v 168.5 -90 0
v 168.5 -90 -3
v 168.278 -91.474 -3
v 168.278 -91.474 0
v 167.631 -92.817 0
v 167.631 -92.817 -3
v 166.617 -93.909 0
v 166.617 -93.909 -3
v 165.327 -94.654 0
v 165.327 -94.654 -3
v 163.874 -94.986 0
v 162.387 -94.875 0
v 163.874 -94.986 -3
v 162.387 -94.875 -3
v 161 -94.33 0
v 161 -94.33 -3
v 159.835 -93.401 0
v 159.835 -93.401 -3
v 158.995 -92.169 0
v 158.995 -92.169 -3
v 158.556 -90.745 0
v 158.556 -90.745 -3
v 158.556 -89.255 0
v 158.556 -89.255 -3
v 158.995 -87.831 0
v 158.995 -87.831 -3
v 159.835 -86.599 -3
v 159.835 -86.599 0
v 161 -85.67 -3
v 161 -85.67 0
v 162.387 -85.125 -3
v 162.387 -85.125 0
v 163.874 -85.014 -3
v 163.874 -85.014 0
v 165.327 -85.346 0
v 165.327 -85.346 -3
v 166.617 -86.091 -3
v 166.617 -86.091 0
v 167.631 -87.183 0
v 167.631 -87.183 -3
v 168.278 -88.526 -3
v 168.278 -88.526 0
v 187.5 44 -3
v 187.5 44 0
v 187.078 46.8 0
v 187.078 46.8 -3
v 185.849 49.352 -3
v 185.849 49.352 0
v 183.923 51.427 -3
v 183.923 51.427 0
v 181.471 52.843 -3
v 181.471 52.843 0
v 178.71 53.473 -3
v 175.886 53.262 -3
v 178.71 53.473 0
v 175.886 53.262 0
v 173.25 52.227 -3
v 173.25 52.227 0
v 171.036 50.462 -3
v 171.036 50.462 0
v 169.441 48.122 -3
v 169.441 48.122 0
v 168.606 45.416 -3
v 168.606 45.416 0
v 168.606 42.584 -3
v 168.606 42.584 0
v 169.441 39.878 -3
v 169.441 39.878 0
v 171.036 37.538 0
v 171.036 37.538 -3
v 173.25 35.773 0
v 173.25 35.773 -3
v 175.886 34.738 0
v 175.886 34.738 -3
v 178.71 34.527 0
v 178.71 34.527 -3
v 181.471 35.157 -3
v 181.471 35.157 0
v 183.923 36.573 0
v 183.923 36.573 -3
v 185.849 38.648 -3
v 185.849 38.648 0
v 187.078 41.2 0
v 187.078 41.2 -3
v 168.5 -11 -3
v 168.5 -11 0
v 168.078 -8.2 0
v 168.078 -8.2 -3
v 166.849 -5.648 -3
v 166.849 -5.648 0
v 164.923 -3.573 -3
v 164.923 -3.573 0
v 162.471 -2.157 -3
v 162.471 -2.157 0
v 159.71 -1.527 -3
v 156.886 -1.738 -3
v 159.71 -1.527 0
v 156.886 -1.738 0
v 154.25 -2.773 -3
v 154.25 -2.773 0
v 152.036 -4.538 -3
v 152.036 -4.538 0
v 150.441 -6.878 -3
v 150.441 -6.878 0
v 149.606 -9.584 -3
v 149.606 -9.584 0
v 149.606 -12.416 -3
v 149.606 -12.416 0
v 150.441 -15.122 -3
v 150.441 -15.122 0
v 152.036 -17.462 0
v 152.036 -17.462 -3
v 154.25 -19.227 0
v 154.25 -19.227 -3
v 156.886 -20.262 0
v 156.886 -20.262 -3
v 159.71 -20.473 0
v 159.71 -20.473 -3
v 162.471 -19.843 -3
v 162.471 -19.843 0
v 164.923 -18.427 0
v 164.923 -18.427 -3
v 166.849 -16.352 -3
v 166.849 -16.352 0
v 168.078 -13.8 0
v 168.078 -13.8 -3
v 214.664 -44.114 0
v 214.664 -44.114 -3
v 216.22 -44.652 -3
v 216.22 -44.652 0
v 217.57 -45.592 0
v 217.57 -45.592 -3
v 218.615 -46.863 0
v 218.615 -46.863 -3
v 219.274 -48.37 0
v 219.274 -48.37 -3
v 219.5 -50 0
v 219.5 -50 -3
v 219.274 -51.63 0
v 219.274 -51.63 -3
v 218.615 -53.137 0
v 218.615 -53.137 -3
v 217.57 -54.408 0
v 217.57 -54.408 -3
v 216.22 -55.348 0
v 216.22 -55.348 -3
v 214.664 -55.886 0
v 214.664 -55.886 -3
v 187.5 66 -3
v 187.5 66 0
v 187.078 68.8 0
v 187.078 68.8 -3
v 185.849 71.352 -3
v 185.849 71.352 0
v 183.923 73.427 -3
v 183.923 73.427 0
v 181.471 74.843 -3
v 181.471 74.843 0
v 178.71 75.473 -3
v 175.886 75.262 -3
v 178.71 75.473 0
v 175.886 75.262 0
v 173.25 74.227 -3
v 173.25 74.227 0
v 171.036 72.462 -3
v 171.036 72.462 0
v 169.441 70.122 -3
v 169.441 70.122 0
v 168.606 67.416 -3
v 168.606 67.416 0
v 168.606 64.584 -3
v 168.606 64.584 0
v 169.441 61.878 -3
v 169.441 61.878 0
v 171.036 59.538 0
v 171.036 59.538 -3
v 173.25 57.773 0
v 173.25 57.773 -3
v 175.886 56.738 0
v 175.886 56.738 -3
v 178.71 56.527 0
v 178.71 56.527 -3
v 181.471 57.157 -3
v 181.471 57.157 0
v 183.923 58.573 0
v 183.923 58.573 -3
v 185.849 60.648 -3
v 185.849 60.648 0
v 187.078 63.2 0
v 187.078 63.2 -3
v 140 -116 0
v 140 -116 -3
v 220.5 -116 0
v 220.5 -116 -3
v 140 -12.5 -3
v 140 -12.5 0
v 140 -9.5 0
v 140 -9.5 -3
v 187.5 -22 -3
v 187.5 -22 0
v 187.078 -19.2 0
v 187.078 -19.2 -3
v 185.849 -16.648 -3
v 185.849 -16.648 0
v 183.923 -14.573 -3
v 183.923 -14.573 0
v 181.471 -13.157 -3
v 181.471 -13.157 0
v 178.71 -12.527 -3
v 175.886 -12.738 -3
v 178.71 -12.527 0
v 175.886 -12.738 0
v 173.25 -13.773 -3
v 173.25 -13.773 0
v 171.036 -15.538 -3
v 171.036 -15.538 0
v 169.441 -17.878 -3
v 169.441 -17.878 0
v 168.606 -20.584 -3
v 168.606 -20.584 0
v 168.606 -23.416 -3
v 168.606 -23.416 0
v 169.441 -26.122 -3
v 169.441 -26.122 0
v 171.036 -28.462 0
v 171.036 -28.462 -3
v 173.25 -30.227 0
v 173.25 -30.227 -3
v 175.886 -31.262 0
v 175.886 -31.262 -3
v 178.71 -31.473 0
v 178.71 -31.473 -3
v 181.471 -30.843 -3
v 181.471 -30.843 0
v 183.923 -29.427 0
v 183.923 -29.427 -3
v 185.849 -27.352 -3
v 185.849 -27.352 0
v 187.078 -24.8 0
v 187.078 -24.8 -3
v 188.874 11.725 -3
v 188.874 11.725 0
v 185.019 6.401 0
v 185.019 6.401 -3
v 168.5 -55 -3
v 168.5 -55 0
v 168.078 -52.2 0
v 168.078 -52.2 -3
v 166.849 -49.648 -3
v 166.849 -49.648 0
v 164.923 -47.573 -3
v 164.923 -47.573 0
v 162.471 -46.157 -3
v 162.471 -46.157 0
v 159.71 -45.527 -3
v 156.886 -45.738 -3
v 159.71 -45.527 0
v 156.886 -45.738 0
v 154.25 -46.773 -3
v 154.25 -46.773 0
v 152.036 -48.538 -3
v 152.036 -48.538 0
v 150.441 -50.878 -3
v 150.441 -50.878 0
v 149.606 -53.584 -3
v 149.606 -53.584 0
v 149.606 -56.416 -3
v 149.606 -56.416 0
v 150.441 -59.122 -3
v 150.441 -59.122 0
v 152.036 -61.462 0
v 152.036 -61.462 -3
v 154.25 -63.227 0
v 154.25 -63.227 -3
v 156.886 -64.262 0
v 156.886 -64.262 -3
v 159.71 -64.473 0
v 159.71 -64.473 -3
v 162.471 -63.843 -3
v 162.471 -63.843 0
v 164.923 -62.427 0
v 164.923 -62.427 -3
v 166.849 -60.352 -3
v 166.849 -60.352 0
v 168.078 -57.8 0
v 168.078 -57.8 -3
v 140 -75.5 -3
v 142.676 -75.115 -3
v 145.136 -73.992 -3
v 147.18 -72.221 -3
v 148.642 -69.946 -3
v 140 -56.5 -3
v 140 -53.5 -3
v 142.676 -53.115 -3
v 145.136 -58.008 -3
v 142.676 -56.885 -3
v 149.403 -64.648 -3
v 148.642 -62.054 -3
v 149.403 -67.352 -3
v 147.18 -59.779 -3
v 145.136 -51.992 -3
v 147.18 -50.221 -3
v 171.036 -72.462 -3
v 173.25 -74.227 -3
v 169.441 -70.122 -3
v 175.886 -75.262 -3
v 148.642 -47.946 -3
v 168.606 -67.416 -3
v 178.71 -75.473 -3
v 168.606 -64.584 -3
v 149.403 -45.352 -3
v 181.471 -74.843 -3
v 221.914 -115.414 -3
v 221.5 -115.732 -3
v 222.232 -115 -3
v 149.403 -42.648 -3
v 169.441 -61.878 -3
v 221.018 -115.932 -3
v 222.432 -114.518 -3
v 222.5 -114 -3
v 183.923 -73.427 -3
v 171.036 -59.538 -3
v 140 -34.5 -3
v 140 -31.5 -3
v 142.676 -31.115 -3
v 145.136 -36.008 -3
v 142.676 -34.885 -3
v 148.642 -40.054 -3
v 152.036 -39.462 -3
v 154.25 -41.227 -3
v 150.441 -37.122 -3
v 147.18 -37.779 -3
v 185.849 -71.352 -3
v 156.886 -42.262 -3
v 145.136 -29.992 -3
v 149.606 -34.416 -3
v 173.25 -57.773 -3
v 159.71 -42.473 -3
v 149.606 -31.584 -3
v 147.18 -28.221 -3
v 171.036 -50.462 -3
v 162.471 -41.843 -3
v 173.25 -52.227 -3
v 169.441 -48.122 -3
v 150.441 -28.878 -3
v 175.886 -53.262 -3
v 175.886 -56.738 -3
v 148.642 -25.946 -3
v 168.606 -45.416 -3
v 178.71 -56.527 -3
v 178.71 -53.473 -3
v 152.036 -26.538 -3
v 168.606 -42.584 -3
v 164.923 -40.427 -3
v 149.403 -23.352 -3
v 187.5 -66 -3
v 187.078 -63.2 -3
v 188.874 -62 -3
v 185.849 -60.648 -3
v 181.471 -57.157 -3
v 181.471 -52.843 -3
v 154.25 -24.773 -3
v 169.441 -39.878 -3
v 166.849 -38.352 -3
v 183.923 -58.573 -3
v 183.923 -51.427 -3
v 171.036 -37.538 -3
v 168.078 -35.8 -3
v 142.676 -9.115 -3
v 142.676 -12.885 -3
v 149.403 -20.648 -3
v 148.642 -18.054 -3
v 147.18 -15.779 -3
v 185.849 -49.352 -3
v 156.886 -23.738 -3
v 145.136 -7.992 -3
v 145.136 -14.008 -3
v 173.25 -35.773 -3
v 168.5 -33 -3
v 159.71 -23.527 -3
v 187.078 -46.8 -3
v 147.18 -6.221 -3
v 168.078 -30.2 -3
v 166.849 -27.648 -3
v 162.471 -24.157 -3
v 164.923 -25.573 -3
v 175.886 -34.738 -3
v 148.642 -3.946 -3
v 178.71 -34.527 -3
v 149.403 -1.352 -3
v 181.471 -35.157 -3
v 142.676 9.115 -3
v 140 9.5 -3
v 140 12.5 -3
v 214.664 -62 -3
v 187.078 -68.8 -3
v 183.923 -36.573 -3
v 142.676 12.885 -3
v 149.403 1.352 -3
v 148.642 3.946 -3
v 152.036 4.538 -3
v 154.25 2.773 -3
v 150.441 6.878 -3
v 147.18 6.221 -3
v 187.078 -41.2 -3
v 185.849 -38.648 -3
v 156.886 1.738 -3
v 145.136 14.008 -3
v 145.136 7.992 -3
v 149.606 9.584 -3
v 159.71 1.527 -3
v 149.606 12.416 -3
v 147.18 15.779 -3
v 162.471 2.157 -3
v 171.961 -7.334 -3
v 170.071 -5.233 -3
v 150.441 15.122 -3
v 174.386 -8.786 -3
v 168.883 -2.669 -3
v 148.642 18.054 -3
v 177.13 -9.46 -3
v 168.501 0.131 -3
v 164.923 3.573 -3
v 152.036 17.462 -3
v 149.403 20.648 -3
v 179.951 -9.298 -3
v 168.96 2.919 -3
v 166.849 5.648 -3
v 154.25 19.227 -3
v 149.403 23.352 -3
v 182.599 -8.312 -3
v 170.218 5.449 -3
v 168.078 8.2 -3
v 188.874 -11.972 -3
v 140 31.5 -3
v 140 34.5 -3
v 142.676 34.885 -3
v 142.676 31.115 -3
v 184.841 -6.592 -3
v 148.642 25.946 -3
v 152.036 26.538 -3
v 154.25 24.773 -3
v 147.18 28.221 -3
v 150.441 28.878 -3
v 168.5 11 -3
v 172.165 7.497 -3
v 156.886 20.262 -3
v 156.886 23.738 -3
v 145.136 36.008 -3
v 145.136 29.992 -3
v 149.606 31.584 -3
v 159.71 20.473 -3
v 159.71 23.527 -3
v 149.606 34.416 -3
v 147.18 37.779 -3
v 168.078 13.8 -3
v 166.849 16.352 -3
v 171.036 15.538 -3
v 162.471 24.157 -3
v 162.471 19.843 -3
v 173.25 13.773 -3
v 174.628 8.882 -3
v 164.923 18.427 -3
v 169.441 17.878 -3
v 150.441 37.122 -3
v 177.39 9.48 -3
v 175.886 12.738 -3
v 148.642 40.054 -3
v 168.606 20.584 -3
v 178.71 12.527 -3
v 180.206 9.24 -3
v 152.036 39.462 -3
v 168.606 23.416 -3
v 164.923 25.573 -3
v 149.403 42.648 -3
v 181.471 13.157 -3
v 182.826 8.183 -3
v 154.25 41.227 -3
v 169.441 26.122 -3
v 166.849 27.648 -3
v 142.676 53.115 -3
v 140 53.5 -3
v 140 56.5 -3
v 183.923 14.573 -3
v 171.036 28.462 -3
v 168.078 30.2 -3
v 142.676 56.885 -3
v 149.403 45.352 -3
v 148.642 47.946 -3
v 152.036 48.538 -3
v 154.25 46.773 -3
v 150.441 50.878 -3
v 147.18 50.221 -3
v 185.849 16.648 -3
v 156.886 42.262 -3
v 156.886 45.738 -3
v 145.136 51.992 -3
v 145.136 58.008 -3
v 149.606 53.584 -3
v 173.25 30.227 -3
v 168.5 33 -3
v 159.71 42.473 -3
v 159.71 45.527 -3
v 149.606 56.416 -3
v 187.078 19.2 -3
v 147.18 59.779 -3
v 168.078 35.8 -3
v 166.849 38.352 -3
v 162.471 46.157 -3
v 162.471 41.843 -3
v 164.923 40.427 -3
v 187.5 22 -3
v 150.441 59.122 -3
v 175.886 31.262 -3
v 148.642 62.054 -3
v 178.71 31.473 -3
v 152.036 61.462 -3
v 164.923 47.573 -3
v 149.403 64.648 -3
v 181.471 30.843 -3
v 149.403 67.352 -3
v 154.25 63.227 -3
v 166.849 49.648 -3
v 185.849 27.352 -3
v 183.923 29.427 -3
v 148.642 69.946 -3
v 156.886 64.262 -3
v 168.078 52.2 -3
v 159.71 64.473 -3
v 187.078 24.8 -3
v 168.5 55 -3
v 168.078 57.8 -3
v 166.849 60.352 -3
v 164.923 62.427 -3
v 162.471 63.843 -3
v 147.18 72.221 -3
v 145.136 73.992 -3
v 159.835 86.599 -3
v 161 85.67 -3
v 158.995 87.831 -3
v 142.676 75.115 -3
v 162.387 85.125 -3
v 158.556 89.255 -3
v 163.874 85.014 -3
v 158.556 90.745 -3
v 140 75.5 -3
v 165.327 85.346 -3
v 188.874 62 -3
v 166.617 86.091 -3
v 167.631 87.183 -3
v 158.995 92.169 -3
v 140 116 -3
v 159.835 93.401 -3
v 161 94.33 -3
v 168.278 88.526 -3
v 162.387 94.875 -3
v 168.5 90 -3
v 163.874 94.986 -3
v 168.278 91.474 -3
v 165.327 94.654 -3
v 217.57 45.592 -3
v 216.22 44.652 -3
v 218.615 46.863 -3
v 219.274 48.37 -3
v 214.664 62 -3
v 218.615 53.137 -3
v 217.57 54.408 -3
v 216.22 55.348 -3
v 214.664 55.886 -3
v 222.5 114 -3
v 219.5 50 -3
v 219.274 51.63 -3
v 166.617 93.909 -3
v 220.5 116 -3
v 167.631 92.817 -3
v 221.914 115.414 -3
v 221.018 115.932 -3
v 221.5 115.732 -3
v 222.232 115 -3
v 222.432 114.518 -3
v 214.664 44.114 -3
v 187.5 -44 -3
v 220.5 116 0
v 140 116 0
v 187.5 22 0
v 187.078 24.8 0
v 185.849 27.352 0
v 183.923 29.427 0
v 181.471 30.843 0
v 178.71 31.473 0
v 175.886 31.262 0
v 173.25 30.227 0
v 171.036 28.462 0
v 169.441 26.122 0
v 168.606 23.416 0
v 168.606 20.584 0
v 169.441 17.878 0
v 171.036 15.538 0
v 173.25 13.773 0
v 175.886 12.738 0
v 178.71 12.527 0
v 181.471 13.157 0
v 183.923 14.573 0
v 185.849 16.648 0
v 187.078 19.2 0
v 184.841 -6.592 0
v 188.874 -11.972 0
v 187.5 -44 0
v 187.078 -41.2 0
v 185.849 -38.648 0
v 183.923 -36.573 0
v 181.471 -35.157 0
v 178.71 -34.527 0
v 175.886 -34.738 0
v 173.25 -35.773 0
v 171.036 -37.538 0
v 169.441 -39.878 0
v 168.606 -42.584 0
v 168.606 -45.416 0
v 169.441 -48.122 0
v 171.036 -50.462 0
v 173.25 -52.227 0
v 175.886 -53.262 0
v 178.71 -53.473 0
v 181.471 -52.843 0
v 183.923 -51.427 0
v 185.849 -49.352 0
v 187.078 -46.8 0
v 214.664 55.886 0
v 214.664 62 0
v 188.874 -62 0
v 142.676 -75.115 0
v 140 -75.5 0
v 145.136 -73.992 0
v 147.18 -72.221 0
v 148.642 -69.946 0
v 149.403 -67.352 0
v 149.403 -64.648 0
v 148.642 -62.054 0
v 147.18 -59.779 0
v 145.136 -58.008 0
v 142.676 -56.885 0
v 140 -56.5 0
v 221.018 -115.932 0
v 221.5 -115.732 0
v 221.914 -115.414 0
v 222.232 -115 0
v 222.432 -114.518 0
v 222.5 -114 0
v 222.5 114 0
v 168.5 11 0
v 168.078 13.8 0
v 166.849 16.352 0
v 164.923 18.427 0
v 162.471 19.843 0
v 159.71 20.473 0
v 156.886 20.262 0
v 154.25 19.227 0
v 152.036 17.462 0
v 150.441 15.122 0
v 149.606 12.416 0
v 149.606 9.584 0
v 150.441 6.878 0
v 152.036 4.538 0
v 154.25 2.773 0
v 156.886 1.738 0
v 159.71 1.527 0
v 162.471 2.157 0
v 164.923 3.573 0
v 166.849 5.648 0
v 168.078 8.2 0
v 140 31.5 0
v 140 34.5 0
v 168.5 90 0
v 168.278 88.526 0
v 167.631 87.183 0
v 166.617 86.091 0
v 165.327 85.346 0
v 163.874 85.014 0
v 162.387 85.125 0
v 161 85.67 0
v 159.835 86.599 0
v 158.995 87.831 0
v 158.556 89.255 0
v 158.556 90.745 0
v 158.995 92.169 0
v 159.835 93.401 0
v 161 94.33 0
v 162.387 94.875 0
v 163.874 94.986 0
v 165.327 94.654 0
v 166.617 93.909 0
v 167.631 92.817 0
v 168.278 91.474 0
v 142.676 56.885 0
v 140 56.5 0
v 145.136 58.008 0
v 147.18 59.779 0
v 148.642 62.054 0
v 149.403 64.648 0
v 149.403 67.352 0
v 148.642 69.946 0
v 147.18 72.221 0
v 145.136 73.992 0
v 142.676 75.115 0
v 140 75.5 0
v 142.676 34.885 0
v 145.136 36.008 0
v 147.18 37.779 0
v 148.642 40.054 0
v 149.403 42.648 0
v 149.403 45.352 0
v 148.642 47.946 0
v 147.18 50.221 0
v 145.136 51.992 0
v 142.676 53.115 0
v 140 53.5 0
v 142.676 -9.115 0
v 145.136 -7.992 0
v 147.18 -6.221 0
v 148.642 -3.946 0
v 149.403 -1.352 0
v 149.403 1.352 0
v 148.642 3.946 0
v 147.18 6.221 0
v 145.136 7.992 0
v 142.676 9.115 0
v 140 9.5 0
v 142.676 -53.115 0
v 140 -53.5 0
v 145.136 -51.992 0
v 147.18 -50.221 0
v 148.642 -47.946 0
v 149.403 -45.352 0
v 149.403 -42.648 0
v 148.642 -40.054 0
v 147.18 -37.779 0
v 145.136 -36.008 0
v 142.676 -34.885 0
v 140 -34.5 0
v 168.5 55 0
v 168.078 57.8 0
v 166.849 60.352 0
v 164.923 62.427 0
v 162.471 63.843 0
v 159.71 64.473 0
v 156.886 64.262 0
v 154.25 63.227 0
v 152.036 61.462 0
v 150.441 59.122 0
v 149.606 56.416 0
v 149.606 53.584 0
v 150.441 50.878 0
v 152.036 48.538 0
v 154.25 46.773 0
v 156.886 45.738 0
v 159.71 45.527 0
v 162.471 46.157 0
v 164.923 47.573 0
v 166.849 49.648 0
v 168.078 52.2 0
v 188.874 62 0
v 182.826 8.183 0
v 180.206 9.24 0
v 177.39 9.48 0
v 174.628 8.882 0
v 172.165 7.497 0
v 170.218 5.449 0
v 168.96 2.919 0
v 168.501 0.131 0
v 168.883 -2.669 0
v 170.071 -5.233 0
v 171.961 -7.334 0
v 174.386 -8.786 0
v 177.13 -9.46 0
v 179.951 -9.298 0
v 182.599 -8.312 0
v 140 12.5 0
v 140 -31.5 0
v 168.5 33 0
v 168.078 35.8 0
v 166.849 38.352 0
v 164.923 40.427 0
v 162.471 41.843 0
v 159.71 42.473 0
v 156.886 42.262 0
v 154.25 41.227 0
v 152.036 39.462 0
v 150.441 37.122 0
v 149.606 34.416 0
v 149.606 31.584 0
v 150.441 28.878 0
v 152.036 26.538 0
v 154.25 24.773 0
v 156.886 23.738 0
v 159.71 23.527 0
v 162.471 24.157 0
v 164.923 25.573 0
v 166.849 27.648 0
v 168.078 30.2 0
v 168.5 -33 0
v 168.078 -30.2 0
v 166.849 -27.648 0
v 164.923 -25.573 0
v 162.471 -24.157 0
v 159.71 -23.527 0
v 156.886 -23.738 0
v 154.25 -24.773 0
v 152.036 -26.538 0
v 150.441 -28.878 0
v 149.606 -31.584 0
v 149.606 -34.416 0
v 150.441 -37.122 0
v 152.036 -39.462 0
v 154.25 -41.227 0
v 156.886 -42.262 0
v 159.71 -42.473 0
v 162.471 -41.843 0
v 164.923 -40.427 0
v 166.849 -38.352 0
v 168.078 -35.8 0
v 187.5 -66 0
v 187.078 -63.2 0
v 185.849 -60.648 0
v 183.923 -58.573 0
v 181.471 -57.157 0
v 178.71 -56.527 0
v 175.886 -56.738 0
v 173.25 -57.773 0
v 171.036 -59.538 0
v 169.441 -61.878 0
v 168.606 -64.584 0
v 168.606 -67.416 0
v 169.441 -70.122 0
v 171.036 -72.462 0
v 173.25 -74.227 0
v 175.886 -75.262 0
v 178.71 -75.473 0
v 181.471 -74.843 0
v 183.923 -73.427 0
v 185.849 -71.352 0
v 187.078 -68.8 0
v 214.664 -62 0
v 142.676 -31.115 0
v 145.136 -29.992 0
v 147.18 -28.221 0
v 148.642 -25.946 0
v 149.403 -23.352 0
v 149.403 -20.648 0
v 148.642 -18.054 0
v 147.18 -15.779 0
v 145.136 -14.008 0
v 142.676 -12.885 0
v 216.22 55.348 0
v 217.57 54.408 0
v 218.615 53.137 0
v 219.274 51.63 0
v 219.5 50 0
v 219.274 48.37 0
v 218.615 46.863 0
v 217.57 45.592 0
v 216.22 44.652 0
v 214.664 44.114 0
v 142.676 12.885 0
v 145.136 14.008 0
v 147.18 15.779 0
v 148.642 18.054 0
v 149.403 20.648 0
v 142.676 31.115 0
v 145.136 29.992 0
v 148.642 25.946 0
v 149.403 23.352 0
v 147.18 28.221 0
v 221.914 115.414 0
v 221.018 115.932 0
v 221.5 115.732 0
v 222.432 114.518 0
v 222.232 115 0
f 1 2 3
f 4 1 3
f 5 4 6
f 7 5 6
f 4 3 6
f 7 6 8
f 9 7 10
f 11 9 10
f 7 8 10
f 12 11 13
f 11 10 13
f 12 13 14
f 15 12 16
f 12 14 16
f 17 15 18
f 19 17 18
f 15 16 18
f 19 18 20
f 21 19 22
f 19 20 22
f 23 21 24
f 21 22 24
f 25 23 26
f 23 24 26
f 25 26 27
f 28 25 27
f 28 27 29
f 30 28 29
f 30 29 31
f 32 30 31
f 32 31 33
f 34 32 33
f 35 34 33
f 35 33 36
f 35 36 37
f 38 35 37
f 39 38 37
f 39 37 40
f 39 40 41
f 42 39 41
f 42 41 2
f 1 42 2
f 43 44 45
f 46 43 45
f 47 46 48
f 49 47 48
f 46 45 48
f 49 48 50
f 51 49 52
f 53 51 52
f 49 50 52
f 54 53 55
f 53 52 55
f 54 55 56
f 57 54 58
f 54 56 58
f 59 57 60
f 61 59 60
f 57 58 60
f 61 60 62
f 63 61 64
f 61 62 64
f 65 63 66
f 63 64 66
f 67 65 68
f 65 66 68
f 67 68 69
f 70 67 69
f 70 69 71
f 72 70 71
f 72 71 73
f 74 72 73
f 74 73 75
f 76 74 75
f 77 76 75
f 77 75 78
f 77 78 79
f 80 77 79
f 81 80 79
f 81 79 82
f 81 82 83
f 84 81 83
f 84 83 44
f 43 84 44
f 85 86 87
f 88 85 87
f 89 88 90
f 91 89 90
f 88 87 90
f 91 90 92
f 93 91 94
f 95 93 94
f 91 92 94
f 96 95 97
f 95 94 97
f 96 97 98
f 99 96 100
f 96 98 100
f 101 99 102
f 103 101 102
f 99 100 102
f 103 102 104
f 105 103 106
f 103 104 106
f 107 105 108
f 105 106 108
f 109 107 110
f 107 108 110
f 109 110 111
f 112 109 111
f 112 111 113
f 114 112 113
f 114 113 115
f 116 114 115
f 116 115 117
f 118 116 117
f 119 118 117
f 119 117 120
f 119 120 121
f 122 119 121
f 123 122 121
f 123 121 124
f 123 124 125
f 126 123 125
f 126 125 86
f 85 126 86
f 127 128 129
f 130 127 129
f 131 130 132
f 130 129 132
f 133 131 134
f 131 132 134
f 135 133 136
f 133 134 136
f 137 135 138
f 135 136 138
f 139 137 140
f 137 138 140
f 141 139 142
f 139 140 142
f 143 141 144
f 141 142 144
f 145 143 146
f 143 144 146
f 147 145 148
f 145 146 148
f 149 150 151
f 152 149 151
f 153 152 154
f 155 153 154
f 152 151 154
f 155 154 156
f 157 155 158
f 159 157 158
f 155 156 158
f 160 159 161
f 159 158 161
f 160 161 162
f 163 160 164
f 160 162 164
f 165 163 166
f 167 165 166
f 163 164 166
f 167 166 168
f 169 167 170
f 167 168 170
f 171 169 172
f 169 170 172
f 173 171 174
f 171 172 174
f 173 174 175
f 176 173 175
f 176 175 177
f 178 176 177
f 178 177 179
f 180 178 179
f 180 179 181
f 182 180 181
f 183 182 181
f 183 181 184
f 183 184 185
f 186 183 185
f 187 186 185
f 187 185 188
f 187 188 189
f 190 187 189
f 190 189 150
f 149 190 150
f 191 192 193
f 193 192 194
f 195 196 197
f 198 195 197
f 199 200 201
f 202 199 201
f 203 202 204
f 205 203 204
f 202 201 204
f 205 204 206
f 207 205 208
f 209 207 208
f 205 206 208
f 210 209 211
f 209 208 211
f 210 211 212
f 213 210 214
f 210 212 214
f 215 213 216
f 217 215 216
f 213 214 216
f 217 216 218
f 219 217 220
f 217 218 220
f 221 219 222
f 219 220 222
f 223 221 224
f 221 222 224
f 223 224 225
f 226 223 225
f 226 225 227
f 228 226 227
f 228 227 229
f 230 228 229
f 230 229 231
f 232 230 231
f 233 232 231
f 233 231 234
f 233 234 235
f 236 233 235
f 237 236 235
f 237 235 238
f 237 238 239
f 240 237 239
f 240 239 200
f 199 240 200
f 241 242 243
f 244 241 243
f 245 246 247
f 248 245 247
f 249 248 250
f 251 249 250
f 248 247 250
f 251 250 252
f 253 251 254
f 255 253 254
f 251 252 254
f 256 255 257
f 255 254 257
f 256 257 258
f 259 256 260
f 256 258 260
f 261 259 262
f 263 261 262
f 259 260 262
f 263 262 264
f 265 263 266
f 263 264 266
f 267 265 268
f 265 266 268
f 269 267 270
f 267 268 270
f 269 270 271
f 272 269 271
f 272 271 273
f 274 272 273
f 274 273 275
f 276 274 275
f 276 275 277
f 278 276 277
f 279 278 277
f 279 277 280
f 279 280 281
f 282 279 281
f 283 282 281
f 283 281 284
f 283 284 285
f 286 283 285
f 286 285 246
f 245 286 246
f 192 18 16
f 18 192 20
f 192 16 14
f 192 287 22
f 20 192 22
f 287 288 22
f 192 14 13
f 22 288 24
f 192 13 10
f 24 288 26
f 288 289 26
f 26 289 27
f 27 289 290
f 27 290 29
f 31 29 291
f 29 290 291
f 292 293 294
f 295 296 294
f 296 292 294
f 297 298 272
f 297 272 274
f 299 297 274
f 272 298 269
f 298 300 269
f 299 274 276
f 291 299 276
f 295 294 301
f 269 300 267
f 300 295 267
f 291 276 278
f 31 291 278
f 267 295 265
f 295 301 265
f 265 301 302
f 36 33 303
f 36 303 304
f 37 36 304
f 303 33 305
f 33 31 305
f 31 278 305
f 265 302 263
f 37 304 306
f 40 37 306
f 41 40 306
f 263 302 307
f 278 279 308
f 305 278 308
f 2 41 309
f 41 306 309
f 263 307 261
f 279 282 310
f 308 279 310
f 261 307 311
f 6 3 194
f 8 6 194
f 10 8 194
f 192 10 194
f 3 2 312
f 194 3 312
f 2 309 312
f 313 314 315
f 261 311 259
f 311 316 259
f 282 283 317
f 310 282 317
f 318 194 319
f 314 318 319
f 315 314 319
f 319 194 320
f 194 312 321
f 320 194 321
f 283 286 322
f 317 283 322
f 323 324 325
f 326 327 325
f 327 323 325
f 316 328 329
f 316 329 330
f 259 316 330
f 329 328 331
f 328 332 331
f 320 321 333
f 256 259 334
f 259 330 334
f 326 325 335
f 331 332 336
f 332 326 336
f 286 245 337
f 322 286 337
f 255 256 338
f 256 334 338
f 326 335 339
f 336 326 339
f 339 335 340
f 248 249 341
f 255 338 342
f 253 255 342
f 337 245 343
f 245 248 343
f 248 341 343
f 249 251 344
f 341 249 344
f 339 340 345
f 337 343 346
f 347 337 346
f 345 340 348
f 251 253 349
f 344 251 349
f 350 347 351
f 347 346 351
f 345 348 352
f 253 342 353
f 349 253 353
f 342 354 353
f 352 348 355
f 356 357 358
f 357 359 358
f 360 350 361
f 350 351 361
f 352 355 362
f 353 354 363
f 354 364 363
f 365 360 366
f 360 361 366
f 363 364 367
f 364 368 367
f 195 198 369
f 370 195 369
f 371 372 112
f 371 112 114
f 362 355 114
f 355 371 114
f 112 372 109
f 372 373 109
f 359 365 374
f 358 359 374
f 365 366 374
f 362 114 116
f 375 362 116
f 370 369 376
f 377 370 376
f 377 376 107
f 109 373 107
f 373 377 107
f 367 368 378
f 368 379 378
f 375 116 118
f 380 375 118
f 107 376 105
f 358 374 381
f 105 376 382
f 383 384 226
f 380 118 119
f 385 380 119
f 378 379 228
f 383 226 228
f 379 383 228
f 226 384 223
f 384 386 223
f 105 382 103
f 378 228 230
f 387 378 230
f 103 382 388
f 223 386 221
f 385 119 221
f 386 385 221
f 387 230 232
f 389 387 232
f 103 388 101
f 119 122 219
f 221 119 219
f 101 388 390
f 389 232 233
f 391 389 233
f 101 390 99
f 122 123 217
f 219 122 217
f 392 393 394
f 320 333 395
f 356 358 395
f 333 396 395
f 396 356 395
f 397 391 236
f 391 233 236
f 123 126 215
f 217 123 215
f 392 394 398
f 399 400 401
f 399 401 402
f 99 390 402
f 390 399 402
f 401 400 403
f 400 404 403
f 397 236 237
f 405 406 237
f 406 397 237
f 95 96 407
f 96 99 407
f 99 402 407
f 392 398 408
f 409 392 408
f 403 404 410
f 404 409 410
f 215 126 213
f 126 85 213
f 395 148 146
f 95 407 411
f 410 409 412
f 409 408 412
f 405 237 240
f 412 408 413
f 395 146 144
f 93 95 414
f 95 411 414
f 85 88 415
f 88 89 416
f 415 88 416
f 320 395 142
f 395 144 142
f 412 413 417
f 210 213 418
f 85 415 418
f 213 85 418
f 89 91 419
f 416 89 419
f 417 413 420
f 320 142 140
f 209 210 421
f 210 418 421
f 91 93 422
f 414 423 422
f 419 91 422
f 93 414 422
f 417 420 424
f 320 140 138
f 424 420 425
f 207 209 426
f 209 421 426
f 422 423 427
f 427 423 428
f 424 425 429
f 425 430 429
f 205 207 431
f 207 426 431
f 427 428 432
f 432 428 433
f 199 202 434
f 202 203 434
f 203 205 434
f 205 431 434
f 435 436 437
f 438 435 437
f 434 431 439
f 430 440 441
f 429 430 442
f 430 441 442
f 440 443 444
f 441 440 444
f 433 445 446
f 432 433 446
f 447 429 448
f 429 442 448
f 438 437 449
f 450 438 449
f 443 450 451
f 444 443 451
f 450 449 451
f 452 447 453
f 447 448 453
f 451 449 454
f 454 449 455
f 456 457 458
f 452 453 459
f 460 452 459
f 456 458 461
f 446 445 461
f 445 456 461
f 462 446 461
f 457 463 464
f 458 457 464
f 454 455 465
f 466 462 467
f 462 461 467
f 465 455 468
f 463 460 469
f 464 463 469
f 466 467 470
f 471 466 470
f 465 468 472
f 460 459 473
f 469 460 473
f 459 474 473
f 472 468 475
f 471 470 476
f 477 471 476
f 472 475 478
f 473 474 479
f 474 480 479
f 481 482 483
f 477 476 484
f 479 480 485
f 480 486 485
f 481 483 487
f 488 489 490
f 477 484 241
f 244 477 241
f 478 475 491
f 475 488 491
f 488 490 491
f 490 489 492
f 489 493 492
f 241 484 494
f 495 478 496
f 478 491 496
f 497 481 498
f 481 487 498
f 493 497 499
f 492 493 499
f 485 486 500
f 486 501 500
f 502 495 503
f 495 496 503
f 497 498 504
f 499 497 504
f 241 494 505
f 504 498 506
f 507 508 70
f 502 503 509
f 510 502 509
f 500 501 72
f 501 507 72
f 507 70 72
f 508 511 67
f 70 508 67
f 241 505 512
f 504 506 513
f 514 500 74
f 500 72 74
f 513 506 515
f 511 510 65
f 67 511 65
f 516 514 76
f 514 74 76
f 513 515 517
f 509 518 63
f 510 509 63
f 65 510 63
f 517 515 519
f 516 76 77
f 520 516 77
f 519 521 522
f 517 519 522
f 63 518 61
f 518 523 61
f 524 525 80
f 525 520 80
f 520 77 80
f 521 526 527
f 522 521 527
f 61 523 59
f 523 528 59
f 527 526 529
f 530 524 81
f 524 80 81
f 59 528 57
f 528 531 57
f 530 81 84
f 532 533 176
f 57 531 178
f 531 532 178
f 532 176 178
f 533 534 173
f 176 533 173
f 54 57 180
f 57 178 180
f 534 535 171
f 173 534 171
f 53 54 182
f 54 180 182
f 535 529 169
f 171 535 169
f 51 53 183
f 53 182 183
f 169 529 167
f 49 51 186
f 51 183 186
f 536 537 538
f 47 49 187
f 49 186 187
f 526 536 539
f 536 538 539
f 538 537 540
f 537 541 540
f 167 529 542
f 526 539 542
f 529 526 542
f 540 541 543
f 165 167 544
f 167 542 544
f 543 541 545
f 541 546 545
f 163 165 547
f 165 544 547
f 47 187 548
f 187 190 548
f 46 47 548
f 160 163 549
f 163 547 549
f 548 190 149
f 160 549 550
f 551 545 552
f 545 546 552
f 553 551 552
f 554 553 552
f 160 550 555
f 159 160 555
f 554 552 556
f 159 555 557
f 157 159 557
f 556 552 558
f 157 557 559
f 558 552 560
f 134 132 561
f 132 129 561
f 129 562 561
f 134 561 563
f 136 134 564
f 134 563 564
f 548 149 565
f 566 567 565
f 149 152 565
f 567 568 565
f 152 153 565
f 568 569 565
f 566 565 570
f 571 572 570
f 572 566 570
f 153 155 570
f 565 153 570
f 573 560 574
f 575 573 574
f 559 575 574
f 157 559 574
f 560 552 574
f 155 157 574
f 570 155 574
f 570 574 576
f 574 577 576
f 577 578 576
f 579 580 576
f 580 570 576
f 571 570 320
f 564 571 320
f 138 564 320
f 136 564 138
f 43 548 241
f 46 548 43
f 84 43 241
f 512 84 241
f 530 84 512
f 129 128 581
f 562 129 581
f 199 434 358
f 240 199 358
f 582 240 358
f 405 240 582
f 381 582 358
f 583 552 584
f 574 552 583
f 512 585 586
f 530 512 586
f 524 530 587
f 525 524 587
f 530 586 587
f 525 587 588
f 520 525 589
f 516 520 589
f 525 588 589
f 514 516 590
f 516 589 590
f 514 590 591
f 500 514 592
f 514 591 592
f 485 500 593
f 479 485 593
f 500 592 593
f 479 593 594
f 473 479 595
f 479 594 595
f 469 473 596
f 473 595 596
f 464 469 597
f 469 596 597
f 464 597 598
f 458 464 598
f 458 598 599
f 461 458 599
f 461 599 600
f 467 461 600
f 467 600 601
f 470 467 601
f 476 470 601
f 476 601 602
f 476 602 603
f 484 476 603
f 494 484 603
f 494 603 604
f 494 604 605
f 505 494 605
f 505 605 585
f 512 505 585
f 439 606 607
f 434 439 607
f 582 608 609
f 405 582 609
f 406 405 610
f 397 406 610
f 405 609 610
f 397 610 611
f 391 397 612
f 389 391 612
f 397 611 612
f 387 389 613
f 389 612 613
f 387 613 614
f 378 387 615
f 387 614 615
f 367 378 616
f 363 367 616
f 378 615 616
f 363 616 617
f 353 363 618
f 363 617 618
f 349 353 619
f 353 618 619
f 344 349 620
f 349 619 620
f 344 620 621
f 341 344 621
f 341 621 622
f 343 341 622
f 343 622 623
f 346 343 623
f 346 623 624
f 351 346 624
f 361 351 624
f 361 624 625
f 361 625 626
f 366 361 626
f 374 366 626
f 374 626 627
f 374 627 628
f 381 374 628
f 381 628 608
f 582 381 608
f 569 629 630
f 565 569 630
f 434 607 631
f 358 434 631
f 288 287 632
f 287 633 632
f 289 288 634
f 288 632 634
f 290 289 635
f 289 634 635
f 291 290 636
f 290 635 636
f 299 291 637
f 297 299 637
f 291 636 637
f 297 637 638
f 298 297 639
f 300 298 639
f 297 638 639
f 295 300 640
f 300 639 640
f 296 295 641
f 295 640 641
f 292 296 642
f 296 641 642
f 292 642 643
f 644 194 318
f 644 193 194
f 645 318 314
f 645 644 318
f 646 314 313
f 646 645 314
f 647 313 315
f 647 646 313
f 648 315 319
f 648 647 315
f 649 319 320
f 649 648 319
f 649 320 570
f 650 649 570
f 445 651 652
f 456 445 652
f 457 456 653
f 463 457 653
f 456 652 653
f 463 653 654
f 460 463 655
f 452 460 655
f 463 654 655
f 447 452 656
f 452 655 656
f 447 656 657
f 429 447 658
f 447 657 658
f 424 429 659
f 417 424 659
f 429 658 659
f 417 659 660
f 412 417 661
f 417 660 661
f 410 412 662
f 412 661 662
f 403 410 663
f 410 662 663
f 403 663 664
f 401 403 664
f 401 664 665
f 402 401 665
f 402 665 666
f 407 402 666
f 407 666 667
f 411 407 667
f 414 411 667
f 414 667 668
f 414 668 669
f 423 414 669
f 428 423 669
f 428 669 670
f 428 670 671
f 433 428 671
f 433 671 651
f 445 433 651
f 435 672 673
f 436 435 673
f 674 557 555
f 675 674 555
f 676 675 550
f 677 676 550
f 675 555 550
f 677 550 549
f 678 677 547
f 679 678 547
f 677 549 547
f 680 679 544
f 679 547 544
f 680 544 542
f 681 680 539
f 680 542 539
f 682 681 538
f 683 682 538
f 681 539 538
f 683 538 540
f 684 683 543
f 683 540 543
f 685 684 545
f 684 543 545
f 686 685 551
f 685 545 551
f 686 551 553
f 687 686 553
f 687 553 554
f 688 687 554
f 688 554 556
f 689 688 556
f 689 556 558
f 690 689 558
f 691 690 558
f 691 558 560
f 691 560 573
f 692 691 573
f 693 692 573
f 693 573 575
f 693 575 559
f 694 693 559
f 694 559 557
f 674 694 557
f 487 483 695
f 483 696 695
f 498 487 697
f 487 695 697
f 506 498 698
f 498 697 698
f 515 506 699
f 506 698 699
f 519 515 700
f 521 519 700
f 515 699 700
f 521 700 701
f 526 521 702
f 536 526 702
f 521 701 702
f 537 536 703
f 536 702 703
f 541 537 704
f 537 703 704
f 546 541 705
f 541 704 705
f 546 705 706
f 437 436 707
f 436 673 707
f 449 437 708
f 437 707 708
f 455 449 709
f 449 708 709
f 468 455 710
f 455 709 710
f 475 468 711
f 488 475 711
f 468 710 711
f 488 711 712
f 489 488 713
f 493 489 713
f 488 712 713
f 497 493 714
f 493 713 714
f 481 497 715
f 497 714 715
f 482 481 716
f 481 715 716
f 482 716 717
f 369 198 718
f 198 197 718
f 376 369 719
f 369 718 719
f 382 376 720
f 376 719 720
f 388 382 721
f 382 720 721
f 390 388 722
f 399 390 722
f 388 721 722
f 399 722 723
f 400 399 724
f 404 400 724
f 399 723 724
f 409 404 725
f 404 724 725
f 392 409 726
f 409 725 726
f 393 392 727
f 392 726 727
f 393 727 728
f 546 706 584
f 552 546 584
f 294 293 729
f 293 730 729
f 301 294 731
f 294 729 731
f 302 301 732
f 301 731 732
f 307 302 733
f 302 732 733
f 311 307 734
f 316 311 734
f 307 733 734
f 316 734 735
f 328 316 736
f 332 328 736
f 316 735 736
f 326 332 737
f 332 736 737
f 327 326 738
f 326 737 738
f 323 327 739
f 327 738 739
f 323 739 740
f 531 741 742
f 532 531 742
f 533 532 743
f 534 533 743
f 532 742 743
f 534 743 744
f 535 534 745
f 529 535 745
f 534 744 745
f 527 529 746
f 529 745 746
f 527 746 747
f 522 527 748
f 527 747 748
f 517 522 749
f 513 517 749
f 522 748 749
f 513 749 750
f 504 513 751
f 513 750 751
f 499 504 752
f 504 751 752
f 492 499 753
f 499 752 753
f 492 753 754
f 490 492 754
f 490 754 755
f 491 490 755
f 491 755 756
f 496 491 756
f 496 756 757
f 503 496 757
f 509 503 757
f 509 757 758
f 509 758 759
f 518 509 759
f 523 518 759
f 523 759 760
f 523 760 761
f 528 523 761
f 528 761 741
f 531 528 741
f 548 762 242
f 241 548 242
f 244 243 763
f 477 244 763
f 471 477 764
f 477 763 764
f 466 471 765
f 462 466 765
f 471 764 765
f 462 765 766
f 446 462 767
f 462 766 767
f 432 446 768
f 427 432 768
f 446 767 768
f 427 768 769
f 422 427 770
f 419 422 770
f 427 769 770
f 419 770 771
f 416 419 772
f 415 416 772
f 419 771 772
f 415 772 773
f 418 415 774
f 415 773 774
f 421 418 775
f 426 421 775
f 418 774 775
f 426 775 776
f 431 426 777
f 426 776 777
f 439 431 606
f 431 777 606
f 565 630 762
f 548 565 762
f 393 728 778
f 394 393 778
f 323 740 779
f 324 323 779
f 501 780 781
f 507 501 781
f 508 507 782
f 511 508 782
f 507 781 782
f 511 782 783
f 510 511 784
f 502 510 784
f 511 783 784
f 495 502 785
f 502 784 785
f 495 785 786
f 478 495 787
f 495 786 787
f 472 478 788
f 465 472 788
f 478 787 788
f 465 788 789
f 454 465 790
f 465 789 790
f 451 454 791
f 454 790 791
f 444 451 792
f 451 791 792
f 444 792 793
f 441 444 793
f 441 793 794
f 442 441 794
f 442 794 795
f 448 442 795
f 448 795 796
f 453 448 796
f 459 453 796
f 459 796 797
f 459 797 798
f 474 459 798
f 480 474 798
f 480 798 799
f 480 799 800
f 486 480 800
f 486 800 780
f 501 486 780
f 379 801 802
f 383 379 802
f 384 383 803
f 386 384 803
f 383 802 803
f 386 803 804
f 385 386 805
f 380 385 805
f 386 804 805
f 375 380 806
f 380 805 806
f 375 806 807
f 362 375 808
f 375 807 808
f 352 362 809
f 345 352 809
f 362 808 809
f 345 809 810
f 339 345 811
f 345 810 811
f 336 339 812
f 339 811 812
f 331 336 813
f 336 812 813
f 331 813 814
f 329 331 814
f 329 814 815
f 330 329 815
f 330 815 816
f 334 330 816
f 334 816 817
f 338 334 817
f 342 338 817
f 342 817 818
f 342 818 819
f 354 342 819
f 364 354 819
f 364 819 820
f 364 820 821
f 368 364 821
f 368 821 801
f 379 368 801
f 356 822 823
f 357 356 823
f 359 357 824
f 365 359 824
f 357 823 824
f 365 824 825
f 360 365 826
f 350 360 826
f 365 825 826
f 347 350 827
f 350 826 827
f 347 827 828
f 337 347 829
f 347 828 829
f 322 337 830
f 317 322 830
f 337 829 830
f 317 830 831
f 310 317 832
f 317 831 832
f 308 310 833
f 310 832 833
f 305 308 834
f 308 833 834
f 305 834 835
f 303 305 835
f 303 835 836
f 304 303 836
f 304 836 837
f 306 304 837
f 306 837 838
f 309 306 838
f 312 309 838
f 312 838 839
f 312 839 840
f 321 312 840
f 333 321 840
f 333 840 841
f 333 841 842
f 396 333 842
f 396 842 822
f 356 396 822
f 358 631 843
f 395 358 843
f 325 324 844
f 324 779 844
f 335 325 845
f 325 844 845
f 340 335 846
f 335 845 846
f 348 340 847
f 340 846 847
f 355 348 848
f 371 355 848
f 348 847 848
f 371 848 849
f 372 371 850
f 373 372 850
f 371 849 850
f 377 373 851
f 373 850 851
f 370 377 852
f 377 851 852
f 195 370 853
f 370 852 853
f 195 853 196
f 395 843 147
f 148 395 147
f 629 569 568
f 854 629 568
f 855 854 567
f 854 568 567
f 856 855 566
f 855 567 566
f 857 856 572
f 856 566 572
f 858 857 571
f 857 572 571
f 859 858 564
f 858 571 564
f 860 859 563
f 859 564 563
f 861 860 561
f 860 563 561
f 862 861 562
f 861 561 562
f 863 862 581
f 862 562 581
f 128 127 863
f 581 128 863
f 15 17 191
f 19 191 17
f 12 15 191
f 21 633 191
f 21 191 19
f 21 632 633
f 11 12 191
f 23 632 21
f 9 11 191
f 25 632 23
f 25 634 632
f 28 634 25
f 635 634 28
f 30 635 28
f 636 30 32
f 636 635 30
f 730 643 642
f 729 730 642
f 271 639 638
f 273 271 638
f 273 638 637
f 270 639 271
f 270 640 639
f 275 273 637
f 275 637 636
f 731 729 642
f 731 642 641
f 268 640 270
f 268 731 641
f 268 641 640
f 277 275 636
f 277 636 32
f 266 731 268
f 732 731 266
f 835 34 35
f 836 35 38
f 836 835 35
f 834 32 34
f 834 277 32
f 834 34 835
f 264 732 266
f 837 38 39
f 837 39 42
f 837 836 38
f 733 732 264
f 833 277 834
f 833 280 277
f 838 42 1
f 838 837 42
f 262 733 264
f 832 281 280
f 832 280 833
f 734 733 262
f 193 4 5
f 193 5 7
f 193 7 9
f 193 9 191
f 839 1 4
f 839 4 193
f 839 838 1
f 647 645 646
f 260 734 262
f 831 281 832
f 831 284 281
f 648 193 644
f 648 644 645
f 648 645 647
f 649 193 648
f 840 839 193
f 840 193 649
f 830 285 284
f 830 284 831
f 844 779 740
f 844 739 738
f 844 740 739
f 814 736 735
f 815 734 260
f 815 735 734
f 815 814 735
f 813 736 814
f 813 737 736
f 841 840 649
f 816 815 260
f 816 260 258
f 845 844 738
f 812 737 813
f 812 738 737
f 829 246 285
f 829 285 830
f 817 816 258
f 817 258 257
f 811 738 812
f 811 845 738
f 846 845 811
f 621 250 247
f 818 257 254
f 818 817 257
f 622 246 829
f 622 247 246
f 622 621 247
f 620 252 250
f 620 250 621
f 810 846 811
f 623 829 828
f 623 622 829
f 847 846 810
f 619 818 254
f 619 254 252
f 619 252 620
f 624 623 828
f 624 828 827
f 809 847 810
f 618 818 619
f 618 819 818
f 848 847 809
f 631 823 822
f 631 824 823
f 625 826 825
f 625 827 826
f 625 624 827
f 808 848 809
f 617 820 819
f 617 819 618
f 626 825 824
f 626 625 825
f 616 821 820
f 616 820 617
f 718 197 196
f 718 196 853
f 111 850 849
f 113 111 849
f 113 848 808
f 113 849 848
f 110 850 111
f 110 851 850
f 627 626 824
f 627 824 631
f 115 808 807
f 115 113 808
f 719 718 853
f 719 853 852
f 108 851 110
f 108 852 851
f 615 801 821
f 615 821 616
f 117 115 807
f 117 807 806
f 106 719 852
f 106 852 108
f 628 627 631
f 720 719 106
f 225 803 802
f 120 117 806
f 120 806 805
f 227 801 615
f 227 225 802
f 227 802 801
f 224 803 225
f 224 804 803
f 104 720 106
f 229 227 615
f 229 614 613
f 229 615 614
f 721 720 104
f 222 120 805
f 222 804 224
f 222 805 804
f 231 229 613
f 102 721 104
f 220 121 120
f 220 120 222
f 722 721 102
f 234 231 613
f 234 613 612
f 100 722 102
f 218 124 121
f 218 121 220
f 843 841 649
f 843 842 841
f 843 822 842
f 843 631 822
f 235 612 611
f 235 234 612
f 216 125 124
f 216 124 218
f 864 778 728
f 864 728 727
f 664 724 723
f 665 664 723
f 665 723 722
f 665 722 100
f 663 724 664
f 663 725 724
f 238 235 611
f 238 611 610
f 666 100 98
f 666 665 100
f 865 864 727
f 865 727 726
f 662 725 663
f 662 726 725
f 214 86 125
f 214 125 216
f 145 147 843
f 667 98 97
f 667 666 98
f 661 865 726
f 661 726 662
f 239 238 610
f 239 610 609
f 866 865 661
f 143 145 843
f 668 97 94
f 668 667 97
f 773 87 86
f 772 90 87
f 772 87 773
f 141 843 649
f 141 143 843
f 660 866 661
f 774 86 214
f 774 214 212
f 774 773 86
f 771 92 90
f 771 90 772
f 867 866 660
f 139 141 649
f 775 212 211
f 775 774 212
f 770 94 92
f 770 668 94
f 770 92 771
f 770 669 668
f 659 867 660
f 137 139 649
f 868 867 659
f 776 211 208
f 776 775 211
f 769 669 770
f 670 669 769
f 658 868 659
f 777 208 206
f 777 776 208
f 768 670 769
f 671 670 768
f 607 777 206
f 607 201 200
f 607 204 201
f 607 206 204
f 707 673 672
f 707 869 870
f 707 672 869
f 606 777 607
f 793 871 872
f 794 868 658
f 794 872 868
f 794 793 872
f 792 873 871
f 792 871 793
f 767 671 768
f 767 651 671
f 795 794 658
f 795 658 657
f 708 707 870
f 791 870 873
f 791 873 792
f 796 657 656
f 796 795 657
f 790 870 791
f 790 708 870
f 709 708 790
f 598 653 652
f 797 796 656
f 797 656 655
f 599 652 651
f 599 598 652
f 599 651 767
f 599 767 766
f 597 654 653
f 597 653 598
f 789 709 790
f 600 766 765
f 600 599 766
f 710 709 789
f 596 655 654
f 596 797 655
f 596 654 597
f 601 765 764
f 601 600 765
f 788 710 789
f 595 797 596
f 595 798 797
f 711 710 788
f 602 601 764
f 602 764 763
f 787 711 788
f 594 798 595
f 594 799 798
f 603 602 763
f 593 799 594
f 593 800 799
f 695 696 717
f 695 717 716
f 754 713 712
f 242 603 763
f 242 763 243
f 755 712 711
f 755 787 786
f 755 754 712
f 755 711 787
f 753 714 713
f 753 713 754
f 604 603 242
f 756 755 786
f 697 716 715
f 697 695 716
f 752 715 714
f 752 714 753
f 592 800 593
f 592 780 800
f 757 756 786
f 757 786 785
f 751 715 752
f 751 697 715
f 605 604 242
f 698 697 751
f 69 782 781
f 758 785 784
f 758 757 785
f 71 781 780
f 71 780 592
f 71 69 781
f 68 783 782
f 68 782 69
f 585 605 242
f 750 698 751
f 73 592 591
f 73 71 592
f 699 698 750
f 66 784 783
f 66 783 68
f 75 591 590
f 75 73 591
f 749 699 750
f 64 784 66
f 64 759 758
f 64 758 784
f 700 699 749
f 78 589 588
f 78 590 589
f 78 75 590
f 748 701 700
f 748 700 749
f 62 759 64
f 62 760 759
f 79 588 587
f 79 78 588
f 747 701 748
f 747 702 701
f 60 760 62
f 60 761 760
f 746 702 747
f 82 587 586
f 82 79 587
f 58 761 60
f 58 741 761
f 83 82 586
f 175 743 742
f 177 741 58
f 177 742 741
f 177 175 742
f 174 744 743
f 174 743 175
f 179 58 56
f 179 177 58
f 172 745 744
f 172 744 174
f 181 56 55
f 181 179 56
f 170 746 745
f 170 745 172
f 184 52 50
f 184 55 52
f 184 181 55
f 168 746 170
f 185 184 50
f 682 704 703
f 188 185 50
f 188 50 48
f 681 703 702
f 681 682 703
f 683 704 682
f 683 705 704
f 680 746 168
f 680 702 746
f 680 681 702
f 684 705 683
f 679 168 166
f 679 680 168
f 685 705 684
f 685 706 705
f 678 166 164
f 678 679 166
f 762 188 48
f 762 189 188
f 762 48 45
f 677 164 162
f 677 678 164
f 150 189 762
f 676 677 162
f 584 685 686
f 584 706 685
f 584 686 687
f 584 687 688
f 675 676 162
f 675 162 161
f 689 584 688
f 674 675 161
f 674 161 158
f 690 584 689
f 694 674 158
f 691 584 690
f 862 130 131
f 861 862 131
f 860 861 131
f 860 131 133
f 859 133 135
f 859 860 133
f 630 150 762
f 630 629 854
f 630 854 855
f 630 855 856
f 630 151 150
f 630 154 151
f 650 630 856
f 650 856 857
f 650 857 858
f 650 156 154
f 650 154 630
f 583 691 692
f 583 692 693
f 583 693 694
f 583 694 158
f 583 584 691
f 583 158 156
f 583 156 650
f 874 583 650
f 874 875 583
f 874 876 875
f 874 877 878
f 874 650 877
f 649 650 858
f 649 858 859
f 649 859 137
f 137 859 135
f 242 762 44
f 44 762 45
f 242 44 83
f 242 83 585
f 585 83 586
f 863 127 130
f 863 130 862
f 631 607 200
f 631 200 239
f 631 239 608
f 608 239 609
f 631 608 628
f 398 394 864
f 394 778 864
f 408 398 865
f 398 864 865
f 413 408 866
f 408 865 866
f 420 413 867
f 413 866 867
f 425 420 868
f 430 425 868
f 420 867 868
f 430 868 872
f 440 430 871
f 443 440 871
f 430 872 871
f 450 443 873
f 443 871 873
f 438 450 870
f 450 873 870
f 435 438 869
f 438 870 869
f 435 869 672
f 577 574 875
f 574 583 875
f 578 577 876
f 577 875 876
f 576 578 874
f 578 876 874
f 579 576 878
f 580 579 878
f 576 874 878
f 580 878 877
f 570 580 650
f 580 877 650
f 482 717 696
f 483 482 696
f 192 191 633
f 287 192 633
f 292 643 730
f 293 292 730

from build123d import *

# Parameters (mm, degrees)
SKETCH082_W     = 445
SKETCH082_H     = 232
PAD025_DEPTH    = 3
SKETCH083_R     = 9.5
POCKET054_DEPTH = 5
FILLET010_R     = 2
POCKET055_DEPTH = 10.001
SKETCH085_R     = 6
SKETCH085_R_2   = 5
POCKET056_DEPTH = 5
SKETCH094_W     = 459.410004
SKETCH094_H     = 453.216675
POCKET063_DEPTH = 5


with BuildPart() as part:
    # Sketch082 → Pad025 (new body)
    with BuildSketch(Plane.XY):
        Rectangle(SKETCH082_W, SKETCH082_H)
    extrude(amount=PAD025_DEPTH)

    # Sketch083 (on Face6 of Pad025) → Pocket054 (cut)
    with BuildSketch(Plane.XY.offset(3)):
        with Locations((-183, 55)):
            Circle(SKETCH083_R)
        with Locations((-183, 33)):
            Circle(SKETCH083_R)
        with Locations((-183, 11)):
            Circle(SKETCH083_R)
        with Locations((-183, -11)):
            Circle(SKETCH083_R)
        with Locations((-183, -33)):
            Circle(SKETCH083_R)
        with Locations((-183, -55)):
            Circle(SKETCH083_R)
        with Locations((-164, 44)):
            Circle(SKETCH083_R)
        with Locations((-164, 22)):
            Circle(SKETCH083_R)
        with Locations((-164, 0)):
            Circle(SKETCH083_R)
        with Locations((-164, -22)):
            Circle(SKETCH083_R)
        with Locations((-164, -44)):
            Circle(SKETCH083_R)
        with Locations((-145, 55)):
            Circle(SKETCH083_R)
        with Locations((-145, 33)):
            Circle(SKETCH083_R)
        with Locations((-145, 11)):
            Circle(SKETCH083_R)
        with Locations((-145, -11)):
            Circle(SKETCH083_R)
        with Locations((-145, -33)):
            Circle(SKETCH083_R)
        with Locations((-145, -55)):
            Circle(SKETCH083_R)
        with Locations((-126, 44)):
            Circle(SKETCH083_R)
        with Locations((-126, 22)):
            Circle(SKETCH083_R)
        with Locations((-126, 0)):
            Circle(SKETCH083_R)
        with Locations((-126, -22)):
            Circle(SKETCH083_R)
        with Locations((-126, -44)):
            Circle(SKETCH083_R)
        with Locations((-107, 55)):
            Circle(SKETCH083_R)
        with Locations((-107, 33)):
            Circle(SKETCH083_R)
        with Locations((-107, 11)):
            Circle(SKETCH083_R)
        with Locations((-107, -11)):
            Circle(SKETCH083_R)
        with Locations((-107, -33)):
            Circle(SKETCH083_R)
        with Locations((-107, -55)):
            Circle(SKETCH083_R)
        with Locations((-88, -44)):
            Circle(SKETCH083_R)
        with Locations((-88, -22)):
            Circle(SKETCH083_R)
        with Locations((-88, 0)):
            Circle(SKETCH083_R)
        with Locations((-88, 22)):
            Circle(SKETCH083_R)
        with Locations((-88, 44)):
            Circle(SKETCH083_R)
        with Locations((-69, 55)):
            Circle(SKETCH083_R)
        with Locations((-69, 33)):
            Circle(SKETCH083_R)
        with Locations((-69, 11)):
            Circle(SKETCH083_R)
        with Locations((-69, -11)):
            Circle(SKETCH083_R)
        with Locations((-69, -33)):
            Circle(SKETCH083_R)
        with Locations((-50, 44)):
            Circle(SKETCH083_R)
        with Locations((-50, 22)):
            Circle(SKETCH083_R)
        with Locations((-50, 0)):
            Circle(SKETCH083_R)
        with Locations((-50, -22)):
            Circle(SKETCH083_R)
        with Locations((-50, -44)):
            Circle(SKETCH083_R)
        with Locations((-69, -55)):
            Circle(SKETCH083_R)
        with Locations((-31, 55)):
            Circle(SKETCH083_R)
        with Locations((-31, 33)):
            Circle(SKETCH083_R)
        with Locations((-31, 11)):
            Circle(SKETCH083_R)
        with Locations((-31, -11)):
            Circle(SKETCH083_R)
        with Locations((-31, -33)):
            Circle(SKETCH083_R)
        with Locations((-31, -55)):
            Circle(SKETCH083_R)
        with Locations((-12, -44)):
            Circle(SKETCH083_R)
        with Locations((-12, -22)):
            Circle(SKETCH083_R)
        with Locations((-12, 0)):
            Circle(SKETCH083_R)
        with Locations((-12, 22)):
            Circle(SKETCH083_R)
        with Locations((-12, 44)):
            Circle(SKETCH083_R)
        with Locations((7, 55)):
            Circle(SKETCH083_R)
        with Locations((7, 33)):
            Circle(SKETCH083_R)
        with Locations((7, 11)):
            Circle(SKETCH083_R)
        with Locations((7, -11)):
            Circle(SKETCH083_R)
        with Locations((7, -33)):
            Circle(SKETCH083_R)
        with Locations((7, -55)):
            Circle(SKETCH083_R)
        with Locations((26, -44)):
            Circle(SKETCH083_R)
        with Locations((26, -22)):
            Circle(SKETCH083_R)
        with Locations((26, 0)):
            Circle(SKETCH083_R)
        with Locations((26, 22)):
            Circle(SKETCH083_R)
        with Locations((26, 44)):
            Circle(SKETCH083_R)
        with Locations((45, 55)):
            Circle(SKETCH083_R)
        with Locations((45, 33)):
            Circle(SKETCH083_R)
        with Locations((45, 11)):
            Circle(SKETCH083_R)
        with Locations((45, -11)):
            Circle(SKETCH083_R)
        with Locations((64, 0)):
            Circle(SKETCH083_R)
        with Locations((64, 22)):
            Circle(SKETCH083_R)
        with Locations((64, 44)):
            Circle(SKETCH083_R)
        with Locations((45, -33)):
            Circle(SKETCH083_R)
        with Locations((45, -55)):
            Circle(SKETCH083_R)
        with Locations((64, -44)):
            Circle(SKETCH083_R)
        with Locations((64, -22)):
            Circle(SKETCH083_R)
        with Locations((83, 55)):
            Circle(SKETCH083_R)
        with Locations((83, 33)):
            Circle(SKETCH083_R)
        with Locations((83, 11)):
            Circle(SKETCH083_R)
        with Locations((83, -11)):
            Circle(SKETCH083_R)
        with Locations((83, -33)):
            Circle(SKETCH083_R)
        with Locations((83, -55)):
            Circle(SKETCH083_R)
        with Locations((102, 44)):
            Circle(SKETCH083_R)
        with Locations((102, 22)):
            Circle(SKETCH083_R)
        with Locations((102, 0)):
            Circle(SKETCH083_R)
        with Locations((102, -22)):
            Circle(SKETCH083_R)
        with Locations((102, -44)):
            Circle(SKETCH083_R)
        with Locations((121, 55)):
            Circle(SKETCH083_R)
        with Locations((121, 33)):
            Circle(SKETCH083_R)
        with Locations((121, 11)):
            Circle(SKETCH083_R)
        with Locations((121, -11)):
            Circle(SKETCH083_R)
        with Locations((121, -33)):
            Circle(SKETCH083_R)
        with Locations((121, -55)):
            Circle(SKETCH083_R)
        with Locations((140, 44)):
            Circle(SKETCH083_R)
        with Locations((140, 22)):
            Circle(SKETCH083_R)
        with Locations((140, 0)):
            Circle(SKETCH083_R)
        with Locations((140, -22)):
            Circle(SKETCH083_R)
        with Locations((140, -44)):
            Circle(SKETCH083_R)
        with Locations((159, 55)):
            Circle(SKETCH083_R)
        with Locations((159, 33)):
            Circle(SKETCH083_R)
        with Locations((159, 11)):
            Circle(SKETCH083_R)
        with Locations((159, -11)):
            Circle(SKETCH083_R)
        with Locations((159, -33)):
            Circle(SKETCH083_R)
        with Locations((159, -55)):
            Circle(SKETCH083_R)
        with Locations((-164, 66)):
            Circle(SKETCH083_R)
        with Locations((-126, 66)):
            Circle(SKETCH083_R)
        with Locations((-88, 66)):
            Circle(SKETCH083_R)
        with Locations((-50, 66)):
            Circle(SKETCH083_R)
        with Locations((-12, 66)):
            Circle(SKETCH083_R)
        with Locations((26, 66)):
            Circle(SKETCH083_R)
        with Locations((64, 66)):
            Circle(SKETCH083_R)
        with Locations((102, 66)):
            Circle(SKETCH083_R)
        with Locations((140, 66)):
            Circle(SKETCH083_R)
        with Locations((-164, -66)):
            Circle(SKETCH083_R)
        with Locations((-126, -66)):
            Circle(SKETCH083_R)
        with Locations((-88, -66)):
            Circle(SKETCH083_R)
        with Locations((-50, -66)):
            Circle(SKETCH083_R)
        with Locations((-12, -66)):
            Circle(SKETCH083_R)
        with Locations((26, -66)):
            Circle(SKETCH083_R)
        with Locations((64, -66)):
            Circle(SKETCH083_R)
        with Locations((102, -66)):
            Circle(SKETCH083_R)
        with Locations((140, -66)):
            Circle(SKETCH083_R)
        with Locations((178, 66)):
            Circle(SKETCH083_R)
        with Locations((178, 44)):
            Circle(SKETCH083_R)
        with Locations((178, 22)):
            Circle(SKETCH083_R)
        with Locations((178, 0)):
            Circle(SKETCH083_R)
        with Locations((178, -22)):
            Circle(SKETCH083_R)
        with Locations((178, -44)):
            Circle(SKETCH083_R)
        with Locations((178, -66)):
            Circle(SKETCH083_R)
    extrude(amount=-POCKET054_DEPTH, mode=Mode.SUBTRACT)

    # Fillet010
    fillet010_edges = [part.edges().sort_by_distance(p)[0] for p in [
        (-222.5, -116, 1.5),
        (222.5, -116, 1.5),
        (222.5, 116, 1.5),
        (-222.5, 116, 1.5),
    ]]
    fillet(fillet010_edges, radius=FILLET010_R)

    # Sketch084 → Pocket055 (cut, through all)
    with BuildSketch(Plane.XY.offset(10)):
        Polygon((188.873749, -62), (214.664444, -62), (214.664444, 62), (188.873749, 62), (188.873749, 11.724954), (183.462372, 4.250606), (183.462372, -4.752587), (188.873749, -11.972128), align=None)
    extrude(amount=-POCKET055_DEPTH, mode=Mode.SUBTRACT)

    # Sketch085 (on Face2 of Pocket055) → Pocket056 (cut)
    with BuildSketch(Plane(origin=(0, 0, 0), x_dir=(1, 0, 0), z_dir=(0, 0, -1))):
        with Locations((213.5, 50)):
            Circle(SKETCH085_R)
        with Locations((213.5, -50)):
            Circle(SKETCH085_R)
        with Locations((-213.5, 50)):
            Circle(SKETCH085_R)
        with Locations((-213.5, -50)):
            Circle(SKETCH085_R)
        with Locations((-163.5, 90)):
            Circle(SKETCH085_R_2)
        with Locations((-25.5, 90)):
            Circle(SKETCH085_R_2)
        with Locations((163.5, 90)):
            Circle(SKETCH085_R_2)
        with Locations((163.5, -90)):
            Circle(SKETCH085_R_2)
        with Locations((-25.5, -90)):
            Circle(SKETCH085_R_2)
        with Locations((-163.5, -90)):
            Circle(SKETCH085_R_2)
    extrude(amount=-POCKET056_DEPTH, mode=Mode.SUBTRACT)

    # Sketch094 (on Face5 of Pocket056) → Pocket063 (cut)
    with BuildSketch(Plane.XY.offset(3)):
        with Locations((-89.705002, -21.970826)):
            Rectangle(SKETCH094_W, SKETCH094_H)
    extrude(amount=-POCKET063_DEPTH, mode=Mode.SUBTRACT)


with BuildPart() as part_1:
    # Body021 placement: moved
    add(part.part.moved(Location((0, 0, -3))))


solid = part_1.part
